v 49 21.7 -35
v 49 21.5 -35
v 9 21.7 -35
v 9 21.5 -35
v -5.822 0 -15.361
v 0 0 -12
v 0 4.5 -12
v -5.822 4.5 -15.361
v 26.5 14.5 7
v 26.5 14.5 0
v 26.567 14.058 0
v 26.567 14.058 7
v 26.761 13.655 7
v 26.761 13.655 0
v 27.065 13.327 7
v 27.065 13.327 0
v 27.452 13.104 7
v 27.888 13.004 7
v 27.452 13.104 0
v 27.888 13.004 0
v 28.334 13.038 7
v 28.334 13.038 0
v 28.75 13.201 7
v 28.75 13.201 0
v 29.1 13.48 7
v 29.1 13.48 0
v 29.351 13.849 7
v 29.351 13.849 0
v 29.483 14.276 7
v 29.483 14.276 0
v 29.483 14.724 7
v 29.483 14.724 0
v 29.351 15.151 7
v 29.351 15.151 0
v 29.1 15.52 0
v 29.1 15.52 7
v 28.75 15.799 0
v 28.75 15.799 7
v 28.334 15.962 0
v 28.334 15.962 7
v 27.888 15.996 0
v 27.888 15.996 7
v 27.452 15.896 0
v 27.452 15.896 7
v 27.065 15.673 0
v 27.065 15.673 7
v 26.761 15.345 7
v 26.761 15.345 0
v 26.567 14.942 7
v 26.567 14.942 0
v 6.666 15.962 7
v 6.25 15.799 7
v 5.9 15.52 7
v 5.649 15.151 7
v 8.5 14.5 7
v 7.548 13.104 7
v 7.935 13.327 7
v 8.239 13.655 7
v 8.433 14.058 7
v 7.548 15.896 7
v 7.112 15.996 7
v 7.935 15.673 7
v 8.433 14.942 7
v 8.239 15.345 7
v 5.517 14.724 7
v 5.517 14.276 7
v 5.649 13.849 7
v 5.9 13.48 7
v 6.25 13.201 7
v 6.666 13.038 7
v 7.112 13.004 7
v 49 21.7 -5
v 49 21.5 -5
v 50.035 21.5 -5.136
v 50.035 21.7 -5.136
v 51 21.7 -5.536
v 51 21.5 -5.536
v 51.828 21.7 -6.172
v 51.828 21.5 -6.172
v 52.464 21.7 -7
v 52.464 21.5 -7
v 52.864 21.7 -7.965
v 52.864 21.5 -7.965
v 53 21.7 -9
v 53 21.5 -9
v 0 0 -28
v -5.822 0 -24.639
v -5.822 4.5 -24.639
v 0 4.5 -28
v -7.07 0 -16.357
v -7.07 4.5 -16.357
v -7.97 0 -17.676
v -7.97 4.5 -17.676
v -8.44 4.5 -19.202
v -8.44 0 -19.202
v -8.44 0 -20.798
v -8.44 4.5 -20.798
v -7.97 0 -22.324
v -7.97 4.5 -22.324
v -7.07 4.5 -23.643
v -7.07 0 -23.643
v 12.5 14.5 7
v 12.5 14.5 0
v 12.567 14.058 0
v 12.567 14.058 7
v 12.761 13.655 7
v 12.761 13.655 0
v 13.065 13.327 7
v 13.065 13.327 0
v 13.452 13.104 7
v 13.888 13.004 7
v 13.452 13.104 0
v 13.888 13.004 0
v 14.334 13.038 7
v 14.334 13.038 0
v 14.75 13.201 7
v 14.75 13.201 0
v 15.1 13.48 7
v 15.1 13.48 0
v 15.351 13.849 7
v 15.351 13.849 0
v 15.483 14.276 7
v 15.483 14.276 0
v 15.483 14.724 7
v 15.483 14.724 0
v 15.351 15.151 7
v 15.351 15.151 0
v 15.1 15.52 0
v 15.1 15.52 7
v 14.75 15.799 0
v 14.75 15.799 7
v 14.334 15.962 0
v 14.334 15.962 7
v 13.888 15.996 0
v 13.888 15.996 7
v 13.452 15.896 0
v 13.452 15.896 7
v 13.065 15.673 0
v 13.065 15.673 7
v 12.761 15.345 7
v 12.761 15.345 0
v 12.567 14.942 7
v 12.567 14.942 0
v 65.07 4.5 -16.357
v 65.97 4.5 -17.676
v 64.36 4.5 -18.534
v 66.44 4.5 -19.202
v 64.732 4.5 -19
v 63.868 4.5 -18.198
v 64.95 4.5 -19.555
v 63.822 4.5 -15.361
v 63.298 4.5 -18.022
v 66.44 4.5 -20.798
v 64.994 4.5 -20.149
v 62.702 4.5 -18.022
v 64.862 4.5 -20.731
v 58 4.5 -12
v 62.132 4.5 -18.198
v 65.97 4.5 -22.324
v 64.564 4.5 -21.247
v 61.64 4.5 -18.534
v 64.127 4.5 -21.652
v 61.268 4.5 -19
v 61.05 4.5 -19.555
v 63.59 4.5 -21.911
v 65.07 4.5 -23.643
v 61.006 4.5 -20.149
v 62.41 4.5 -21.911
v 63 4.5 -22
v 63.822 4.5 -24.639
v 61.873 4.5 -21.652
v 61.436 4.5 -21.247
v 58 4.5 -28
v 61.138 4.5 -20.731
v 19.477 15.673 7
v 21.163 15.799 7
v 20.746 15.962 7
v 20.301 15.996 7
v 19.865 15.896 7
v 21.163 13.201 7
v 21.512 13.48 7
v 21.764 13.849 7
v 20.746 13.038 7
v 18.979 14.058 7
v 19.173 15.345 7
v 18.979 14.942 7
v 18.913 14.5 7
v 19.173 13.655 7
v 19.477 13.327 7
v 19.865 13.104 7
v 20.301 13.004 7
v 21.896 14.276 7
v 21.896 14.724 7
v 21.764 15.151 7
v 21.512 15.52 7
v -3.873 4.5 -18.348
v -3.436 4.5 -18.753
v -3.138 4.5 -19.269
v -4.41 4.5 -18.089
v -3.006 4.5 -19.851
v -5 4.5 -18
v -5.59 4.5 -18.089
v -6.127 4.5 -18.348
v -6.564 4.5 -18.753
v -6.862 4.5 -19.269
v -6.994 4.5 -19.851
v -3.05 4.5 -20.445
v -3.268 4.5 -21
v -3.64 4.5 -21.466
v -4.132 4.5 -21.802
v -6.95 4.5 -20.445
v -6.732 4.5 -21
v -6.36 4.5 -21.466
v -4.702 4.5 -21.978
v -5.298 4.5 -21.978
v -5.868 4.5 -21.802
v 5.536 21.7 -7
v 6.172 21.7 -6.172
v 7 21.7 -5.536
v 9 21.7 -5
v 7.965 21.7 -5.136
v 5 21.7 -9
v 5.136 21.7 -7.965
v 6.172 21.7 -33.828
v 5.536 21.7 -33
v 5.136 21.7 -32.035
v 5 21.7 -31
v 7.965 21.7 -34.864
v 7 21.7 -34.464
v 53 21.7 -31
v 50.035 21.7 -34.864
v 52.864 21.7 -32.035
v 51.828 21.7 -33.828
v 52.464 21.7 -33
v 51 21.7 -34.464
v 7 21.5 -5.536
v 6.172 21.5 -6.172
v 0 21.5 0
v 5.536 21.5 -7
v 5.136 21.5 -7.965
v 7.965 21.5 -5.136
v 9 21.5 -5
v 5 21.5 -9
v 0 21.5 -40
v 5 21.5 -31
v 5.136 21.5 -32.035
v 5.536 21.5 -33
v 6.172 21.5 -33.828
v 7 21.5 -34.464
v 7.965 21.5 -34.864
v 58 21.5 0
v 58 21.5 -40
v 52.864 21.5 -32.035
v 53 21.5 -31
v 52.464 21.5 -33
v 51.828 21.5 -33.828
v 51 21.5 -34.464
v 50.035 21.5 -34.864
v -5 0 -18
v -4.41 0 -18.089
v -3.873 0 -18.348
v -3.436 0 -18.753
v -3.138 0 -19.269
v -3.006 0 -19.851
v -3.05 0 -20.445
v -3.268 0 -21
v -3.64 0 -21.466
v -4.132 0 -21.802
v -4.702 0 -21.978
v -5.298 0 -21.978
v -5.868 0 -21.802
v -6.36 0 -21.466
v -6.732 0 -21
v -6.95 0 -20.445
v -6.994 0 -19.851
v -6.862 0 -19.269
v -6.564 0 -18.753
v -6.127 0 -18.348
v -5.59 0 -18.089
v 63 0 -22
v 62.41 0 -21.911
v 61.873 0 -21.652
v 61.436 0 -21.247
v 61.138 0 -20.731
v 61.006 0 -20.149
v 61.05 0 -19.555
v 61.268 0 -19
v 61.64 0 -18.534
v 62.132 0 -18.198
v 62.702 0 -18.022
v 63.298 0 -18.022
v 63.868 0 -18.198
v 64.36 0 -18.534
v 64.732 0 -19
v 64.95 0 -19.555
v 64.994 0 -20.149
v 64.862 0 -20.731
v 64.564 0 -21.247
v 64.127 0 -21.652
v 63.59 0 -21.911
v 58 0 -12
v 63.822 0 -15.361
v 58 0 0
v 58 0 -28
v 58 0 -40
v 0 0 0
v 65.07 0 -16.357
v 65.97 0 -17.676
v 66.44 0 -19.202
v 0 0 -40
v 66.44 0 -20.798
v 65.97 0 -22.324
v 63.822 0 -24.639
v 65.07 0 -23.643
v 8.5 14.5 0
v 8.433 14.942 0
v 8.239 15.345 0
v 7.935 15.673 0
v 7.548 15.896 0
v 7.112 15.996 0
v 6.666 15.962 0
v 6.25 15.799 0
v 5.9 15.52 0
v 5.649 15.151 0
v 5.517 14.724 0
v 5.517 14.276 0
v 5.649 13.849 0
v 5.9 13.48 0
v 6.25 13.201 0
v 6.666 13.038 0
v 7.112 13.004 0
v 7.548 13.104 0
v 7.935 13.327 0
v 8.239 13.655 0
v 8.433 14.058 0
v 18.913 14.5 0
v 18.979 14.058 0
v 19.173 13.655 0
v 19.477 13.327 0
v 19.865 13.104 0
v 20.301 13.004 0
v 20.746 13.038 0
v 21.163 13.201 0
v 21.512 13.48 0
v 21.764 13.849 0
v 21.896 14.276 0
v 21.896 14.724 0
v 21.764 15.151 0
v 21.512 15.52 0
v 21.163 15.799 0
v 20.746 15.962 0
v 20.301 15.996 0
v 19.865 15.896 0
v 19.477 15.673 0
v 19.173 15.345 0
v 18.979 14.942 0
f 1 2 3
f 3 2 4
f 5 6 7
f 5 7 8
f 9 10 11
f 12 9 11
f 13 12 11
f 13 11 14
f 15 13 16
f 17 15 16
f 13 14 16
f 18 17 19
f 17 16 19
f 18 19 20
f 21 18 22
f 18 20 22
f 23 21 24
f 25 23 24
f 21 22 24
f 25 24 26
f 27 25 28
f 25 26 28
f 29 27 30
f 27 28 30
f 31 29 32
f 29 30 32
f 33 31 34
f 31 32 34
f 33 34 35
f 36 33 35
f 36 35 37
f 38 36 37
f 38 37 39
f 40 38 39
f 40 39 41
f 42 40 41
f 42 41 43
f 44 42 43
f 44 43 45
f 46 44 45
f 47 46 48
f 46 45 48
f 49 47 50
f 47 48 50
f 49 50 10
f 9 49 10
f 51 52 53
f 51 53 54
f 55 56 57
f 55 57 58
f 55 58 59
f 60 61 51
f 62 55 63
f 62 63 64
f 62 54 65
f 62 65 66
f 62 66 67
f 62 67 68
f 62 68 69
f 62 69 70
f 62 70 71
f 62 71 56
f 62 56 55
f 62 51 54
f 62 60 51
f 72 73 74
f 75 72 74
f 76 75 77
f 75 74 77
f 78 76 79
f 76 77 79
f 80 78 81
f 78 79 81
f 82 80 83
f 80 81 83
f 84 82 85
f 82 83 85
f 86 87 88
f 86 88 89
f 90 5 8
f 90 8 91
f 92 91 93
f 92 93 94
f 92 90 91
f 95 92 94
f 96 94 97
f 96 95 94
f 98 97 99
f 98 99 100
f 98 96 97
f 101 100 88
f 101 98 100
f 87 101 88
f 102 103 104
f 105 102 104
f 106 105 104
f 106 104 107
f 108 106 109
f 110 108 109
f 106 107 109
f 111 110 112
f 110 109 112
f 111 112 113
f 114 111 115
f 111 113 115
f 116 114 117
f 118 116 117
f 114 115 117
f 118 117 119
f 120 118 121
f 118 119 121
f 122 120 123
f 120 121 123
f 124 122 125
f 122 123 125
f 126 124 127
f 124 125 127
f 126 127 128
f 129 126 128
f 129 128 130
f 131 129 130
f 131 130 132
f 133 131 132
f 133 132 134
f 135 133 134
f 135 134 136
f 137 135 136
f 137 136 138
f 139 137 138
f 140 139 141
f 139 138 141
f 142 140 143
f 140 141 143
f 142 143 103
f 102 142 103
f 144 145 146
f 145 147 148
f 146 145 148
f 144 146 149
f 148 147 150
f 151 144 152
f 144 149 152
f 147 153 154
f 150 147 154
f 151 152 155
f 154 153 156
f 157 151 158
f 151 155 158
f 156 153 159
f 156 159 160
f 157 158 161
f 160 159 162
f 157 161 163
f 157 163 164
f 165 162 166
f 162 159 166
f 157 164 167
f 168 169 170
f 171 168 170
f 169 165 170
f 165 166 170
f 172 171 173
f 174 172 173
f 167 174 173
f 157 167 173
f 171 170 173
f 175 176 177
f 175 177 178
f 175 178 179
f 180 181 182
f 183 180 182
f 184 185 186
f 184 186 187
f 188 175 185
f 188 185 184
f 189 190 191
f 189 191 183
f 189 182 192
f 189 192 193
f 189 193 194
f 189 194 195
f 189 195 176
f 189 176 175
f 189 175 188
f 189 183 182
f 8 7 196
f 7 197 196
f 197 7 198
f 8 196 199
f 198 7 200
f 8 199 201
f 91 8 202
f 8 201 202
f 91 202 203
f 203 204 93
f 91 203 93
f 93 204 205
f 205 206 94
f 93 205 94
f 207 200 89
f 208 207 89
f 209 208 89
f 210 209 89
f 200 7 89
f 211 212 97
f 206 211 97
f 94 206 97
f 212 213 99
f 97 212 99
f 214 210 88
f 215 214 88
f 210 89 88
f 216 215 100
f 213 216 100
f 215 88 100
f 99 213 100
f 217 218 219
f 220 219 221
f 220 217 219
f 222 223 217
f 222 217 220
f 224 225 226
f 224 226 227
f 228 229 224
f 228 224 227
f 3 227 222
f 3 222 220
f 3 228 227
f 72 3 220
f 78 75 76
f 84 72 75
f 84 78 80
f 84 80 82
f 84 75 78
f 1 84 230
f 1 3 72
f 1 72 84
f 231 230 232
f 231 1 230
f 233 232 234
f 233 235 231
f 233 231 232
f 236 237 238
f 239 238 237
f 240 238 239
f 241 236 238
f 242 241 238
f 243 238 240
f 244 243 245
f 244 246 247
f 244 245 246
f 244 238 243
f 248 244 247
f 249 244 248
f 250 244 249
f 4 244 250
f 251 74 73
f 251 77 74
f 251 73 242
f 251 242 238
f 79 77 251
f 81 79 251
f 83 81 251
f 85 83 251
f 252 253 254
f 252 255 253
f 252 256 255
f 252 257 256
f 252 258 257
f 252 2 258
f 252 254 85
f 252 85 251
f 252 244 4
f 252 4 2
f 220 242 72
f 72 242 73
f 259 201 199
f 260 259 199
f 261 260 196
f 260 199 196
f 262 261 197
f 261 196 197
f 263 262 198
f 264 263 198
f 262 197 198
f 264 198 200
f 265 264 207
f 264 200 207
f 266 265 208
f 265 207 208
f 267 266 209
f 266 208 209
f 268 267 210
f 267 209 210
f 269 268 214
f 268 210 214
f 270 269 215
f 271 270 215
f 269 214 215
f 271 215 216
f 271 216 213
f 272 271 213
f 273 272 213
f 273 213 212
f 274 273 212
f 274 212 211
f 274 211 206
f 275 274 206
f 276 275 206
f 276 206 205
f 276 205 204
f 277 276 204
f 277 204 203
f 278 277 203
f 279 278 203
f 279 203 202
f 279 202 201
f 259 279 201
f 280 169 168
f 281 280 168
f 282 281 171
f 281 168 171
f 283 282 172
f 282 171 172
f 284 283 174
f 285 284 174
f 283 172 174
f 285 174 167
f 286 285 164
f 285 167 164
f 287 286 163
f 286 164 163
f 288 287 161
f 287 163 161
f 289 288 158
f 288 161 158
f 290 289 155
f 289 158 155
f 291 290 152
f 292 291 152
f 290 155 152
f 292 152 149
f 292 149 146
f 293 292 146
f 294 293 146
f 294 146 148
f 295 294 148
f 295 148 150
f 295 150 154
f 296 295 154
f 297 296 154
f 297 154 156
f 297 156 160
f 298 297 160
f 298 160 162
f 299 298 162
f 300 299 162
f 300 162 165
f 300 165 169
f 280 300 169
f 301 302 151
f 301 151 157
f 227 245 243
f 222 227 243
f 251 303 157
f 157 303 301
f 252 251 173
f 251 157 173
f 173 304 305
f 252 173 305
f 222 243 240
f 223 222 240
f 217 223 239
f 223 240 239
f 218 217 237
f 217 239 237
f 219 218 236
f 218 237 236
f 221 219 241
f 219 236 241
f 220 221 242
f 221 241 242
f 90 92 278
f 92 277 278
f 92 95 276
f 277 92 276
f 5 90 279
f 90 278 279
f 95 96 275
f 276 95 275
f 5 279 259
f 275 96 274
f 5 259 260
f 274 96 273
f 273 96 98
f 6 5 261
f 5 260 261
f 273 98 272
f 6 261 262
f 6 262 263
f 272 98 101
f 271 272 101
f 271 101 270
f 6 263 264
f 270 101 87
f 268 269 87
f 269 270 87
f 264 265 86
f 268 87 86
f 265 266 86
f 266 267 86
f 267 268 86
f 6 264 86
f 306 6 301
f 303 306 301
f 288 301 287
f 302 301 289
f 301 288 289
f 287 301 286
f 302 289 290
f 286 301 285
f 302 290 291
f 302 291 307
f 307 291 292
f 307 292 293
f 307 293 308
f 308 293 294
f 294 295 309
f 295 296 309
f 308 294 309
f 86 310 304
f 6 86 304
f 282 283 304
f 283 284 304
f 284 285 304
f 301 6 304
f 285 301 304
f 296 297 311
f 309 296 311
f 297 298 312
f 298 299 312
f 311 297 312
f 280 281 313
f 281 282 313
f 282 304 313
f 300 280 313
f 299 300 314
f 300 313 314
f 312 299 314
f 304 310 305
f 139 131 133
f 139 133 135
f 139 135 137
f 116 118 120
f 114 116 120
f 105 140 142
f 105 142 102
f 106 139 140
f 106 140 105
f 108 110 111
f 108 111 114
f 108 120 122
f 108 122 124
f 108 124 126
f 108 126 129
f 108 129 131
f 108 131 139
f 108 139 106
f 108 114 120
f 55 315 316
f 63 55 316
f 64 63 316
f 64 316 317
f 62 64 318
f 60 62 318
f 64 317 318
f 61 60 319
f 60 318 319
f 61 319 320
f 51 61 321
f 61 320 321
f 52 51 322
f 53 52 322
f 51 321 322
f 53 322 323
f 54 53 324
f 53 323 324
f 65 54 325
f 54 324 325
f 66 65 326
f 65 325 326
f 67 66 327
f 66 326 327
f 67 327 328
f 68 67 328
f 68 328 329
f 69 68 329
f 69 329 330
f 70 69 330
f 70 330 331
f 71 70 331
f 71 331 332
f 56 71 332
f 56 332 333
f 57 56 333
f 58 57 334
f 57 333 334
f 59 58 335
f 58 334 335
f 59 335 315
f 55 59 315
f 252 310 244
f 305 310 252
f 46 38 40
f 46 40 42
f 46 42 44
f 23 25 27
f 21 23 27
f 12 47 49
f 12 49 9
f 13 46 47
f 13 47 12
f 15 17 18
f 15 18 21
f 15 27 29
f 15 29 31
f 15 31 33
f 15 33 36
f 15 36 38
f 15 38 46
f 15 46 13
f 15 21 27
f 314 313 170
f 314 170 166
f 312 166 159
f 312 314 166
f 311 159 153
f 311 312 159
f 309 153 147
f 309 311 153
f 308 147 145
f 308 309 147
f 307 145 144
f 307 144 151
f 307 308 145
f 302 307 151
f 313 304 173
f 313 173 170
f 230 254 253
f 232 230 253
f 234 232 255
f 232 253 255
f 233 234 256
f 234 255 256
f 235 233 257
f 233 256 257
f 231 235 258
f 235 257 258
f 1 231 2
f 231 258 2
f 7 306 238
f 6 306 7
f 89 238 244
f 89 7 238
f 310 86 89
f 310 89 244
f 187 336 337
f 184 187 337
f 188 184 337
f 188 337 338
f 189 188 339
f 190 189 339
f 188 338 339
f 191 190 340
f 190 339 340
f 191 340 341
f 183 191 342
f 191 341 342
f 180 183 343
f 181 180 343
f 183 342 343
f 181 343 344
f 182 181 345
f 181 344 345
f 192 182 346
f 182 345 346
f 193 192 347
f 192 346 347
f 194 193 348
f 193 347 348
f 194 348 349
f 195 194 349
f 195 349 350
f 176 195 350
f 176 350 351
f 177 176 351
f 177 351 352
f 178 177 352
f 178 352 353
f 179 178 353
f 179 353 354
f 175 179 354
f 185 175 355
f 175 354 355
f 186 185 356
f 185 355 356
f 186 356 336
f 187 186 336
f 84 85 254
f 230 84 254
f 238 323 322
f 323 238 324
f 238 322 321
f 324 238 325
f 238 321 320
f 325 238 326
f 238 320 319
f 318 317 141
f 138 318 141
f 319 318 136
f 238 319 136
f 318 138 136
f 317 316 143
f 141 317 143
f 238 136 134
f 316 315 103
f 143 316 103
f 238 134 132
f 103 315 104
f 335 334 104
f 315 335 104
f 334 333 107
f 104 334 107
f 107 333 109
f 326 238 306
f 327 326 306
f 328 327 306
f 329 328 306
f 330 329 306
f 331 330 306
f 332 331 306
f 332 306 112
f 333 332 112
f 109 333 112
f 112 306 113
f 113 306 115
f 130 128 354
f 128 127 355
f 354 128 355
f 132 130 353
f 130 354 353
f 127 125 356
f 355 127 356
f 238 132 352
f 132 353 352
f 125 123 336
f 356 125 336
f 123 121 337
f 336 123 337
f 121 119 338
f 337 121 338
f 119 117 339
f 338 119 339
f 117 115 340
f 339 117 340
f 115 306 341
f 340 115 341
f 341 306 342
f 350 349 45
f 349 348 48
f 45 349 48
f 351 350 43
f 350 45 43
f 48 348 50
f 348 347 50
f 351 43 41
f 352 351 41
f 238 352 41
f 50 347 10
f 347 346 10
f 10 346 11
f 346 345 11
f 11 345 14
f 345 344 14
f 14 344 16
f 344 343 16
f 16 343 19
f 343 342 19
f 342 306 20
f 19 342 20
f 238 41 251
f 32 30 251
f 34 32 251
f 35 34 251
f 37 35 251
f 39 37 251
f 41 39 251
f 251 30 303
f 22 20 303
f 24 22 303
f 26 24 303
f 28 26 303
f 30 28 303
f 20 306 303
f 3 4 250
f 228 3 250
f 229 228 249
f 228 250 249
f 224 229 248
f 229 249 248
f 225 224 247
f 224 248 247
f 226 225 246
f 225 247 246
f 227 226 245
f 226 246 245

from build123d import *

# Parameters (mm, degrees)
SKETCH1_W           = 58
SKETCH1_H           = 40
BOSS_EXTRUDE1_DEPTH = 21.5
BOSS_EXTRUDE2_DEPTH = 4.5
SKETCH3_R           = 2
CUT_EXTRUDE1_DEPTH  = 80.443376061
BOSS_EXTRUDE3_DEPTH = 0.2
SKETCH6_R           = 1.5
BOSS_EXTRUDE4_DEPTH = 7
SKETCH8_R           = 1.5
BOSS_EXTRUDE6_DEPTH = 7
SKETCH9_R           = 1.5
BOSS_EXTRUDE7_DEPTH = 7


with BuildPart() as part:
    # Sketch1 → Boss-Extrude1 (new body)
    with BuildSketch(Plane(origin=(0, 0, 0), x_dir=(1, 0, 0), z_dir=(0, 1, 0))):
        with Locations((29, 20)):
            Rectangle(SKETCH1_W, SKETCH1_H)
    extrude(amount=BOSS_EXTRUDE1_DEPTH)

    # Sketch2 → Boss-Extrude2 (add)
    with BuildSketch(Plane(origin=(0, 0, 0), x_dir=(1, 0, 0), z_dir=(0, 1, 0))):
        with BuildLine():
            Line((0, 28), (0, 12))
            Line((0, 12), (-5.82179677, 15.361215932))
            ThreePointArc((-5.82179677, 15.361215932), (-8.5, 20), (-5.82179677, 24.638784068))
            Line((-5.82179677, 24.638784068), (0, 28))
        make_face()
        with BuildLine():
            Line((58, 28), (63.82179677, 24.638784068))
            ThreePointArc((63.82179677, 24.638784068), (66.5, 20), (63.82179677, 15.361215932))
            Line((63.82179677, 15.361215932), (58, 12))
            Line((58, 12), (58, 28))
        make_face()
    extrude(amount=BOSS_EXTRUDE2_DEPTH)

    # Sketch3 → Cut-Extrude1 (cut, through all)
    with BuildSketch(Plane(origin=(0, 4.5, 0), x_dir=(1, 0, 0), z_dir=(0, 1, 0))):
        with Locations(Location((-5, 20, 0), (0, 0, 270))):
            Circle(SKETCH3_R)
        with Locations(Location((63, 20, 0), (0, 0, 90))):
            Circle(SKETCH3_R)
    extrude(amount=-CUT_EXTRUDE1_DEPTH, mode=Mode.SUBTRACT)

    # Sketch4 → Boss-Extrude3 (add)
    with BuildSketch(Plane(origin=(0, 21.5, 0), x_dir=(1, 0, 0), z_dir=(0, 1, 0))):
        with BuildLine():
            Line((5, 31), (5, 9))
            ThreePointArc((5, 9), (6.171572875, 6.171572875), (9, 5))
            Line((9, 5), (49, 5))
            ThreePointArc((49, 5), (51.828427125, 6.171572875), (53, 9))
            Line((53, 9), (53, 31))
            ThreePointArc((53, 31), (51.828427125, 33.828427125), (49, 35))
            Line((49, 35), (9, 35))
            ThreePointArc((9, 35), (6.171572875, 33.828427125), (5, 31))
        make_face()
    extrude(amount=BOSS_EXTRUDE3_DEPTH)

    # Sketch6 → Boss-Extrude4 (add)
    with BuildSketch(Plane.XY):
        with Locations((7, 14.5)):
            Circle(SKETCH6_R)
    extrude(amount=BOSS_EXTRUDE4_DEPTH)

    # Sketch8 → Boss-Extrude6 (add)
    with BuildSketch(Plane.XY):
        with Locations(Location((14, 14.5, 0), (0, 0, 180))):
            Circle(SKETCH8_R)
        with Locations(Location((28, 14.5, 0), (0, 0, 180))):
            Circle(SKETCH8_R)
    extrude(amount=BOSS_EXTRUDE6_DEPTH)

    # Sketch9 → Boss-Extrude7 (add)
    with BuildSketch(Plane.XY):
        with Locations(Location((20.412696723, 14.5, 0), (0, 0, 180))):
            Circle(SKETCH9_R)
    extrude(amount=BOSS_EXTRUDE7_DEPTH)


solid = part.part
